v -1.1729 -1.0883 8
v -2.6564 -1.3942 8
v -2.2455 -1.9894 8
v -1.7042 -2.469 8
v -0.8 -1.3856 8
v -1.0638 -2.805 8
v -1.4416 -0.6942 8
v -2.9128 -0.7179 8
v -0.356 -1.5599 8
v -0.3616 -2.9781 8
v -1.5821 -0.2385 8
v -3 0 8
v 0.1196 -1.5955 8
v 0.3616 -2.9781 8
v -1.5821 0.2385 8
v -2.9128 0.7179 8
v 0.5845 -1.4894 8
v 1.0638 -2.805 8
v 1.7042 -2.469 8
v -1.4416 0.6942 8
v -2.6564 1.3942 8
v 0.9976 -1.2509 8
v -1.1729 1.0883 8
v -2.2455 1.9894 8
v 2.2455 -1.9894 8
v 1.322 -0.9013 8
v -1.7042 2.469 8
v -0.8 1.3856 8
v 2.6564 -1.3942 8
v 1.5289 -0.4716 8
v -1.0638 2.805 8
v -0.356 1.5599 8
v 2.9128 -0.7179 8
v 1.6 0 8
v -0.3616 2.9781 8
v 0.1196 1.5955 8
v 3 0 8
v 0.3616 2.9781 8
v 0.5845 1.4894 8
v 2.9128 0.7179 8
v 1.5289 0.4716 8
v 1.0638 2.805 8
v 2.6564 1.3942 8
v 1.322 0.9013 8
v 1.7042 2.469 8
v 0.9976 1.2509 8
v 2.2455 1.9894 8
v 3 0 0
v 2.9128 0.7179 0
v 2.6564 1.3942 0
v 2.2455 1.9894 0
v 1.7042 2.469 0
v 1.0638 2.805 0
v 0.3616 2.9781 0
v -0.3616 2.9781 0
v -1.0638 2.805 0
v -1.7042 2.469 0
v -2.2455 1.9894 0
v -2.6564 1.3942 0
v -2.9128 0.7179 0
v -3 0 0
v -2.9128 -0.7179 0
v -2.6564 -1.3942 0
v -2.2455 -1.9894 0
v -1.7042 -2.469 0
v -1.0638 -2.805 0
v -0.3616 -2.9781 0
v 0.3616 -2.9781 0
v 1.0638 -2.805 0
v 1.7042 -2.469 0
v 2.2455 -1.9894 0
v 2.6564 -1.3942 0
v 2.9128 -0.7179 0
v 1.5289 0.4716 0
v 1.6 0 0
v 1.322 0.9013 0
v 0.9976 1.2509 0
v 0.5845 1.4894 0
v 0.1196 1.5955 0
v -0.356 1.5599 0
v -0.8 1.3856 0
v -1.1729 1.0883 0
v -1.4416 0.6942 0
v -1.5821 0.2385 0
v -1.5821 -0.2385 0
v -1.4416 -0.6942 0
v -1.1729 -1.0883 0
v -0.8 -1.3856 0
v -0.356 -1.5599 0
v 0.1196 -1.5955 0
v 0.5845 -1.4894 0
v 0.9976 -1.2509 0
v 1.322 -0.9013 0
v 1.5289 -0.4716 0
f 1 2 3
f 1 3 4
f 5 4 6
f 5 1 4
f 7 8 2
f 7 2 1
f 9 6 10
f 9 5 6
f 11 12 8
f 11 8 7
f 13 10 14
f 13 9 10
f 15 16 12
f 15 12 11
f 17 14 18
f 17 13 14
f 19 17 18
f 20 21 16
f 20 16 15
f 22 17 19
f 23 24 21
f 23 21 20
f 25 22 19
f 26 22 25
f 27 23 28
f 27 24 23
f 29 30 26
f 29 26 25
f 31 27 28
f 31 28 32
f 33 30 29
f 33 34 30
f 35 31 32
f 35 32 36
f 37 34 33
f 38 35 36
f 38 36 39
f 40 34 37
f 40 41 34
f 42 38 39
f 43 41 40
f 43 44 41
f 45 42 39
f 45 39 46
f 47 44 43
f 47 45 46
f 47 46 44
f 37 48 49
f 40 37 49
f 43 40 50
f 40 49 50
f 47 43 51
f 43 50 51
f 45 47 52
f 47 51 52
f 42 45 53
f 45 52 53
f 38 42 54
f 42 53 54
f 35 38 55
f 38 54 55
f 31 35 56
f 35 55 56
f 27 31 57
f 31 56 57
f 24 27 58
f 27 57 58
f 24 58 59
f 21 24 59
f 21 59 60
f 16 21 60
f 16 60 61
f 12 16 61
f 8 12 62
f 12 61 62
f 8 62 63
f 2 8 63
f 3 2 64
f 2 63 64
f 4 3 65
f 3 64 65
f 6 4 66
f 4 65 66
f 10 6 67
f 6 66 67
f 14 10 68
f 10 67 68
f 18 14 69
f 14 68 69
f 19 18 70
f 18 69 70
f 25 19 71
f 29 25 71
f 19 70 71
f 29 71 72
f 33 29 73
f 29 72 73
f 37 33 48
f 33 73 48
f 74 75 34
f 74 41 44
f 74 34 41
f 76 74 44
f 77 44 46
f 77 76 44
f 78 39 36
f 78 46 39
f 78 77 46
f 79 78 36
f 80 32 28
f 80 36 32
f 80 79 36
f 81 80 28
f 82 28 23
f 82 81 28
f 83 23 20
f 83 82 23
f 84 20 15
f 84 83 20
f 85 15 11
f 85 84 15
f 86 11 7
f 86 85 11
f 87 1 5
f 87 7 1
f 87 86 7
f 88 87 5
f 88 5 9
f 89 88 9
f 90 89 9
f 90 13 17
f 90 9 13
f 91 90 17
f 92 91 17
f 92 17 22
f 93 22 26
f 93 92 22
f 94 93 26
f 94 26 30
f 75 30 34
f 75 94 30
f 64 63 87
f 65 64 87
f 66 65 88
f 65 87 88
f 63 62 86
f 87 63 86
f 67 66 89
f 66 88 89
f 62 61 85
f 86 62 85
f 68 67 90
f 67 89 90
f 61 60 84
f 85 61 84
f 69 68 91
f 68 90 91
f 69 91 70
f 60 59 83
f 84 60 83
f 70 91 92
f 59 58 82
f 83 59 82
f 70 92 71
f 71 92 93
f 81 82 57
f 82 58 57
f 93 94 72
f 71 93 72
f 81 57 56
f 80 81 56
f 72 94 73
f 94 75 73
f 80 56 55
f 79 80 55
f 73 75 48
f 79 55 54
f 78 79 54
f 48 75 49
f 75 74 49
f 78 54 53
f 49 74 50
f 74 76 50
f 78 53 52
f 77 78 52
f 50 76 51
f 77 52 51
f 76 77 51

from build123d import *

# Parameters (mm, degrees)
CYLINDER001_R     = 1.6
CYLINDER001_DEPTH = 10
CYLINDER_R        = 3
CYLINDER_DEPTH    = 8


with BuildPart() as cylinder001:
    # Cylinder001 → Cylinder001 (new body)
    with BuildSketch(Plane.XY.offset(-1)):
        Circle(CYLINDER001_R)
    extrude(amount=CYLINDER001_DEPTH)


with BuildPart() as cut:
    # Cylinder → Cylinder (new body)
    with BuildSketch(Plane.XY):
        Circle(CYLINDER_R)
    extrude(amount=CYLINDER_DEPTH)

    # Cut: cut Cylinder001
    add(cylinder001.part, mode=Mode.SUBTRACT)


solid = cut.part
